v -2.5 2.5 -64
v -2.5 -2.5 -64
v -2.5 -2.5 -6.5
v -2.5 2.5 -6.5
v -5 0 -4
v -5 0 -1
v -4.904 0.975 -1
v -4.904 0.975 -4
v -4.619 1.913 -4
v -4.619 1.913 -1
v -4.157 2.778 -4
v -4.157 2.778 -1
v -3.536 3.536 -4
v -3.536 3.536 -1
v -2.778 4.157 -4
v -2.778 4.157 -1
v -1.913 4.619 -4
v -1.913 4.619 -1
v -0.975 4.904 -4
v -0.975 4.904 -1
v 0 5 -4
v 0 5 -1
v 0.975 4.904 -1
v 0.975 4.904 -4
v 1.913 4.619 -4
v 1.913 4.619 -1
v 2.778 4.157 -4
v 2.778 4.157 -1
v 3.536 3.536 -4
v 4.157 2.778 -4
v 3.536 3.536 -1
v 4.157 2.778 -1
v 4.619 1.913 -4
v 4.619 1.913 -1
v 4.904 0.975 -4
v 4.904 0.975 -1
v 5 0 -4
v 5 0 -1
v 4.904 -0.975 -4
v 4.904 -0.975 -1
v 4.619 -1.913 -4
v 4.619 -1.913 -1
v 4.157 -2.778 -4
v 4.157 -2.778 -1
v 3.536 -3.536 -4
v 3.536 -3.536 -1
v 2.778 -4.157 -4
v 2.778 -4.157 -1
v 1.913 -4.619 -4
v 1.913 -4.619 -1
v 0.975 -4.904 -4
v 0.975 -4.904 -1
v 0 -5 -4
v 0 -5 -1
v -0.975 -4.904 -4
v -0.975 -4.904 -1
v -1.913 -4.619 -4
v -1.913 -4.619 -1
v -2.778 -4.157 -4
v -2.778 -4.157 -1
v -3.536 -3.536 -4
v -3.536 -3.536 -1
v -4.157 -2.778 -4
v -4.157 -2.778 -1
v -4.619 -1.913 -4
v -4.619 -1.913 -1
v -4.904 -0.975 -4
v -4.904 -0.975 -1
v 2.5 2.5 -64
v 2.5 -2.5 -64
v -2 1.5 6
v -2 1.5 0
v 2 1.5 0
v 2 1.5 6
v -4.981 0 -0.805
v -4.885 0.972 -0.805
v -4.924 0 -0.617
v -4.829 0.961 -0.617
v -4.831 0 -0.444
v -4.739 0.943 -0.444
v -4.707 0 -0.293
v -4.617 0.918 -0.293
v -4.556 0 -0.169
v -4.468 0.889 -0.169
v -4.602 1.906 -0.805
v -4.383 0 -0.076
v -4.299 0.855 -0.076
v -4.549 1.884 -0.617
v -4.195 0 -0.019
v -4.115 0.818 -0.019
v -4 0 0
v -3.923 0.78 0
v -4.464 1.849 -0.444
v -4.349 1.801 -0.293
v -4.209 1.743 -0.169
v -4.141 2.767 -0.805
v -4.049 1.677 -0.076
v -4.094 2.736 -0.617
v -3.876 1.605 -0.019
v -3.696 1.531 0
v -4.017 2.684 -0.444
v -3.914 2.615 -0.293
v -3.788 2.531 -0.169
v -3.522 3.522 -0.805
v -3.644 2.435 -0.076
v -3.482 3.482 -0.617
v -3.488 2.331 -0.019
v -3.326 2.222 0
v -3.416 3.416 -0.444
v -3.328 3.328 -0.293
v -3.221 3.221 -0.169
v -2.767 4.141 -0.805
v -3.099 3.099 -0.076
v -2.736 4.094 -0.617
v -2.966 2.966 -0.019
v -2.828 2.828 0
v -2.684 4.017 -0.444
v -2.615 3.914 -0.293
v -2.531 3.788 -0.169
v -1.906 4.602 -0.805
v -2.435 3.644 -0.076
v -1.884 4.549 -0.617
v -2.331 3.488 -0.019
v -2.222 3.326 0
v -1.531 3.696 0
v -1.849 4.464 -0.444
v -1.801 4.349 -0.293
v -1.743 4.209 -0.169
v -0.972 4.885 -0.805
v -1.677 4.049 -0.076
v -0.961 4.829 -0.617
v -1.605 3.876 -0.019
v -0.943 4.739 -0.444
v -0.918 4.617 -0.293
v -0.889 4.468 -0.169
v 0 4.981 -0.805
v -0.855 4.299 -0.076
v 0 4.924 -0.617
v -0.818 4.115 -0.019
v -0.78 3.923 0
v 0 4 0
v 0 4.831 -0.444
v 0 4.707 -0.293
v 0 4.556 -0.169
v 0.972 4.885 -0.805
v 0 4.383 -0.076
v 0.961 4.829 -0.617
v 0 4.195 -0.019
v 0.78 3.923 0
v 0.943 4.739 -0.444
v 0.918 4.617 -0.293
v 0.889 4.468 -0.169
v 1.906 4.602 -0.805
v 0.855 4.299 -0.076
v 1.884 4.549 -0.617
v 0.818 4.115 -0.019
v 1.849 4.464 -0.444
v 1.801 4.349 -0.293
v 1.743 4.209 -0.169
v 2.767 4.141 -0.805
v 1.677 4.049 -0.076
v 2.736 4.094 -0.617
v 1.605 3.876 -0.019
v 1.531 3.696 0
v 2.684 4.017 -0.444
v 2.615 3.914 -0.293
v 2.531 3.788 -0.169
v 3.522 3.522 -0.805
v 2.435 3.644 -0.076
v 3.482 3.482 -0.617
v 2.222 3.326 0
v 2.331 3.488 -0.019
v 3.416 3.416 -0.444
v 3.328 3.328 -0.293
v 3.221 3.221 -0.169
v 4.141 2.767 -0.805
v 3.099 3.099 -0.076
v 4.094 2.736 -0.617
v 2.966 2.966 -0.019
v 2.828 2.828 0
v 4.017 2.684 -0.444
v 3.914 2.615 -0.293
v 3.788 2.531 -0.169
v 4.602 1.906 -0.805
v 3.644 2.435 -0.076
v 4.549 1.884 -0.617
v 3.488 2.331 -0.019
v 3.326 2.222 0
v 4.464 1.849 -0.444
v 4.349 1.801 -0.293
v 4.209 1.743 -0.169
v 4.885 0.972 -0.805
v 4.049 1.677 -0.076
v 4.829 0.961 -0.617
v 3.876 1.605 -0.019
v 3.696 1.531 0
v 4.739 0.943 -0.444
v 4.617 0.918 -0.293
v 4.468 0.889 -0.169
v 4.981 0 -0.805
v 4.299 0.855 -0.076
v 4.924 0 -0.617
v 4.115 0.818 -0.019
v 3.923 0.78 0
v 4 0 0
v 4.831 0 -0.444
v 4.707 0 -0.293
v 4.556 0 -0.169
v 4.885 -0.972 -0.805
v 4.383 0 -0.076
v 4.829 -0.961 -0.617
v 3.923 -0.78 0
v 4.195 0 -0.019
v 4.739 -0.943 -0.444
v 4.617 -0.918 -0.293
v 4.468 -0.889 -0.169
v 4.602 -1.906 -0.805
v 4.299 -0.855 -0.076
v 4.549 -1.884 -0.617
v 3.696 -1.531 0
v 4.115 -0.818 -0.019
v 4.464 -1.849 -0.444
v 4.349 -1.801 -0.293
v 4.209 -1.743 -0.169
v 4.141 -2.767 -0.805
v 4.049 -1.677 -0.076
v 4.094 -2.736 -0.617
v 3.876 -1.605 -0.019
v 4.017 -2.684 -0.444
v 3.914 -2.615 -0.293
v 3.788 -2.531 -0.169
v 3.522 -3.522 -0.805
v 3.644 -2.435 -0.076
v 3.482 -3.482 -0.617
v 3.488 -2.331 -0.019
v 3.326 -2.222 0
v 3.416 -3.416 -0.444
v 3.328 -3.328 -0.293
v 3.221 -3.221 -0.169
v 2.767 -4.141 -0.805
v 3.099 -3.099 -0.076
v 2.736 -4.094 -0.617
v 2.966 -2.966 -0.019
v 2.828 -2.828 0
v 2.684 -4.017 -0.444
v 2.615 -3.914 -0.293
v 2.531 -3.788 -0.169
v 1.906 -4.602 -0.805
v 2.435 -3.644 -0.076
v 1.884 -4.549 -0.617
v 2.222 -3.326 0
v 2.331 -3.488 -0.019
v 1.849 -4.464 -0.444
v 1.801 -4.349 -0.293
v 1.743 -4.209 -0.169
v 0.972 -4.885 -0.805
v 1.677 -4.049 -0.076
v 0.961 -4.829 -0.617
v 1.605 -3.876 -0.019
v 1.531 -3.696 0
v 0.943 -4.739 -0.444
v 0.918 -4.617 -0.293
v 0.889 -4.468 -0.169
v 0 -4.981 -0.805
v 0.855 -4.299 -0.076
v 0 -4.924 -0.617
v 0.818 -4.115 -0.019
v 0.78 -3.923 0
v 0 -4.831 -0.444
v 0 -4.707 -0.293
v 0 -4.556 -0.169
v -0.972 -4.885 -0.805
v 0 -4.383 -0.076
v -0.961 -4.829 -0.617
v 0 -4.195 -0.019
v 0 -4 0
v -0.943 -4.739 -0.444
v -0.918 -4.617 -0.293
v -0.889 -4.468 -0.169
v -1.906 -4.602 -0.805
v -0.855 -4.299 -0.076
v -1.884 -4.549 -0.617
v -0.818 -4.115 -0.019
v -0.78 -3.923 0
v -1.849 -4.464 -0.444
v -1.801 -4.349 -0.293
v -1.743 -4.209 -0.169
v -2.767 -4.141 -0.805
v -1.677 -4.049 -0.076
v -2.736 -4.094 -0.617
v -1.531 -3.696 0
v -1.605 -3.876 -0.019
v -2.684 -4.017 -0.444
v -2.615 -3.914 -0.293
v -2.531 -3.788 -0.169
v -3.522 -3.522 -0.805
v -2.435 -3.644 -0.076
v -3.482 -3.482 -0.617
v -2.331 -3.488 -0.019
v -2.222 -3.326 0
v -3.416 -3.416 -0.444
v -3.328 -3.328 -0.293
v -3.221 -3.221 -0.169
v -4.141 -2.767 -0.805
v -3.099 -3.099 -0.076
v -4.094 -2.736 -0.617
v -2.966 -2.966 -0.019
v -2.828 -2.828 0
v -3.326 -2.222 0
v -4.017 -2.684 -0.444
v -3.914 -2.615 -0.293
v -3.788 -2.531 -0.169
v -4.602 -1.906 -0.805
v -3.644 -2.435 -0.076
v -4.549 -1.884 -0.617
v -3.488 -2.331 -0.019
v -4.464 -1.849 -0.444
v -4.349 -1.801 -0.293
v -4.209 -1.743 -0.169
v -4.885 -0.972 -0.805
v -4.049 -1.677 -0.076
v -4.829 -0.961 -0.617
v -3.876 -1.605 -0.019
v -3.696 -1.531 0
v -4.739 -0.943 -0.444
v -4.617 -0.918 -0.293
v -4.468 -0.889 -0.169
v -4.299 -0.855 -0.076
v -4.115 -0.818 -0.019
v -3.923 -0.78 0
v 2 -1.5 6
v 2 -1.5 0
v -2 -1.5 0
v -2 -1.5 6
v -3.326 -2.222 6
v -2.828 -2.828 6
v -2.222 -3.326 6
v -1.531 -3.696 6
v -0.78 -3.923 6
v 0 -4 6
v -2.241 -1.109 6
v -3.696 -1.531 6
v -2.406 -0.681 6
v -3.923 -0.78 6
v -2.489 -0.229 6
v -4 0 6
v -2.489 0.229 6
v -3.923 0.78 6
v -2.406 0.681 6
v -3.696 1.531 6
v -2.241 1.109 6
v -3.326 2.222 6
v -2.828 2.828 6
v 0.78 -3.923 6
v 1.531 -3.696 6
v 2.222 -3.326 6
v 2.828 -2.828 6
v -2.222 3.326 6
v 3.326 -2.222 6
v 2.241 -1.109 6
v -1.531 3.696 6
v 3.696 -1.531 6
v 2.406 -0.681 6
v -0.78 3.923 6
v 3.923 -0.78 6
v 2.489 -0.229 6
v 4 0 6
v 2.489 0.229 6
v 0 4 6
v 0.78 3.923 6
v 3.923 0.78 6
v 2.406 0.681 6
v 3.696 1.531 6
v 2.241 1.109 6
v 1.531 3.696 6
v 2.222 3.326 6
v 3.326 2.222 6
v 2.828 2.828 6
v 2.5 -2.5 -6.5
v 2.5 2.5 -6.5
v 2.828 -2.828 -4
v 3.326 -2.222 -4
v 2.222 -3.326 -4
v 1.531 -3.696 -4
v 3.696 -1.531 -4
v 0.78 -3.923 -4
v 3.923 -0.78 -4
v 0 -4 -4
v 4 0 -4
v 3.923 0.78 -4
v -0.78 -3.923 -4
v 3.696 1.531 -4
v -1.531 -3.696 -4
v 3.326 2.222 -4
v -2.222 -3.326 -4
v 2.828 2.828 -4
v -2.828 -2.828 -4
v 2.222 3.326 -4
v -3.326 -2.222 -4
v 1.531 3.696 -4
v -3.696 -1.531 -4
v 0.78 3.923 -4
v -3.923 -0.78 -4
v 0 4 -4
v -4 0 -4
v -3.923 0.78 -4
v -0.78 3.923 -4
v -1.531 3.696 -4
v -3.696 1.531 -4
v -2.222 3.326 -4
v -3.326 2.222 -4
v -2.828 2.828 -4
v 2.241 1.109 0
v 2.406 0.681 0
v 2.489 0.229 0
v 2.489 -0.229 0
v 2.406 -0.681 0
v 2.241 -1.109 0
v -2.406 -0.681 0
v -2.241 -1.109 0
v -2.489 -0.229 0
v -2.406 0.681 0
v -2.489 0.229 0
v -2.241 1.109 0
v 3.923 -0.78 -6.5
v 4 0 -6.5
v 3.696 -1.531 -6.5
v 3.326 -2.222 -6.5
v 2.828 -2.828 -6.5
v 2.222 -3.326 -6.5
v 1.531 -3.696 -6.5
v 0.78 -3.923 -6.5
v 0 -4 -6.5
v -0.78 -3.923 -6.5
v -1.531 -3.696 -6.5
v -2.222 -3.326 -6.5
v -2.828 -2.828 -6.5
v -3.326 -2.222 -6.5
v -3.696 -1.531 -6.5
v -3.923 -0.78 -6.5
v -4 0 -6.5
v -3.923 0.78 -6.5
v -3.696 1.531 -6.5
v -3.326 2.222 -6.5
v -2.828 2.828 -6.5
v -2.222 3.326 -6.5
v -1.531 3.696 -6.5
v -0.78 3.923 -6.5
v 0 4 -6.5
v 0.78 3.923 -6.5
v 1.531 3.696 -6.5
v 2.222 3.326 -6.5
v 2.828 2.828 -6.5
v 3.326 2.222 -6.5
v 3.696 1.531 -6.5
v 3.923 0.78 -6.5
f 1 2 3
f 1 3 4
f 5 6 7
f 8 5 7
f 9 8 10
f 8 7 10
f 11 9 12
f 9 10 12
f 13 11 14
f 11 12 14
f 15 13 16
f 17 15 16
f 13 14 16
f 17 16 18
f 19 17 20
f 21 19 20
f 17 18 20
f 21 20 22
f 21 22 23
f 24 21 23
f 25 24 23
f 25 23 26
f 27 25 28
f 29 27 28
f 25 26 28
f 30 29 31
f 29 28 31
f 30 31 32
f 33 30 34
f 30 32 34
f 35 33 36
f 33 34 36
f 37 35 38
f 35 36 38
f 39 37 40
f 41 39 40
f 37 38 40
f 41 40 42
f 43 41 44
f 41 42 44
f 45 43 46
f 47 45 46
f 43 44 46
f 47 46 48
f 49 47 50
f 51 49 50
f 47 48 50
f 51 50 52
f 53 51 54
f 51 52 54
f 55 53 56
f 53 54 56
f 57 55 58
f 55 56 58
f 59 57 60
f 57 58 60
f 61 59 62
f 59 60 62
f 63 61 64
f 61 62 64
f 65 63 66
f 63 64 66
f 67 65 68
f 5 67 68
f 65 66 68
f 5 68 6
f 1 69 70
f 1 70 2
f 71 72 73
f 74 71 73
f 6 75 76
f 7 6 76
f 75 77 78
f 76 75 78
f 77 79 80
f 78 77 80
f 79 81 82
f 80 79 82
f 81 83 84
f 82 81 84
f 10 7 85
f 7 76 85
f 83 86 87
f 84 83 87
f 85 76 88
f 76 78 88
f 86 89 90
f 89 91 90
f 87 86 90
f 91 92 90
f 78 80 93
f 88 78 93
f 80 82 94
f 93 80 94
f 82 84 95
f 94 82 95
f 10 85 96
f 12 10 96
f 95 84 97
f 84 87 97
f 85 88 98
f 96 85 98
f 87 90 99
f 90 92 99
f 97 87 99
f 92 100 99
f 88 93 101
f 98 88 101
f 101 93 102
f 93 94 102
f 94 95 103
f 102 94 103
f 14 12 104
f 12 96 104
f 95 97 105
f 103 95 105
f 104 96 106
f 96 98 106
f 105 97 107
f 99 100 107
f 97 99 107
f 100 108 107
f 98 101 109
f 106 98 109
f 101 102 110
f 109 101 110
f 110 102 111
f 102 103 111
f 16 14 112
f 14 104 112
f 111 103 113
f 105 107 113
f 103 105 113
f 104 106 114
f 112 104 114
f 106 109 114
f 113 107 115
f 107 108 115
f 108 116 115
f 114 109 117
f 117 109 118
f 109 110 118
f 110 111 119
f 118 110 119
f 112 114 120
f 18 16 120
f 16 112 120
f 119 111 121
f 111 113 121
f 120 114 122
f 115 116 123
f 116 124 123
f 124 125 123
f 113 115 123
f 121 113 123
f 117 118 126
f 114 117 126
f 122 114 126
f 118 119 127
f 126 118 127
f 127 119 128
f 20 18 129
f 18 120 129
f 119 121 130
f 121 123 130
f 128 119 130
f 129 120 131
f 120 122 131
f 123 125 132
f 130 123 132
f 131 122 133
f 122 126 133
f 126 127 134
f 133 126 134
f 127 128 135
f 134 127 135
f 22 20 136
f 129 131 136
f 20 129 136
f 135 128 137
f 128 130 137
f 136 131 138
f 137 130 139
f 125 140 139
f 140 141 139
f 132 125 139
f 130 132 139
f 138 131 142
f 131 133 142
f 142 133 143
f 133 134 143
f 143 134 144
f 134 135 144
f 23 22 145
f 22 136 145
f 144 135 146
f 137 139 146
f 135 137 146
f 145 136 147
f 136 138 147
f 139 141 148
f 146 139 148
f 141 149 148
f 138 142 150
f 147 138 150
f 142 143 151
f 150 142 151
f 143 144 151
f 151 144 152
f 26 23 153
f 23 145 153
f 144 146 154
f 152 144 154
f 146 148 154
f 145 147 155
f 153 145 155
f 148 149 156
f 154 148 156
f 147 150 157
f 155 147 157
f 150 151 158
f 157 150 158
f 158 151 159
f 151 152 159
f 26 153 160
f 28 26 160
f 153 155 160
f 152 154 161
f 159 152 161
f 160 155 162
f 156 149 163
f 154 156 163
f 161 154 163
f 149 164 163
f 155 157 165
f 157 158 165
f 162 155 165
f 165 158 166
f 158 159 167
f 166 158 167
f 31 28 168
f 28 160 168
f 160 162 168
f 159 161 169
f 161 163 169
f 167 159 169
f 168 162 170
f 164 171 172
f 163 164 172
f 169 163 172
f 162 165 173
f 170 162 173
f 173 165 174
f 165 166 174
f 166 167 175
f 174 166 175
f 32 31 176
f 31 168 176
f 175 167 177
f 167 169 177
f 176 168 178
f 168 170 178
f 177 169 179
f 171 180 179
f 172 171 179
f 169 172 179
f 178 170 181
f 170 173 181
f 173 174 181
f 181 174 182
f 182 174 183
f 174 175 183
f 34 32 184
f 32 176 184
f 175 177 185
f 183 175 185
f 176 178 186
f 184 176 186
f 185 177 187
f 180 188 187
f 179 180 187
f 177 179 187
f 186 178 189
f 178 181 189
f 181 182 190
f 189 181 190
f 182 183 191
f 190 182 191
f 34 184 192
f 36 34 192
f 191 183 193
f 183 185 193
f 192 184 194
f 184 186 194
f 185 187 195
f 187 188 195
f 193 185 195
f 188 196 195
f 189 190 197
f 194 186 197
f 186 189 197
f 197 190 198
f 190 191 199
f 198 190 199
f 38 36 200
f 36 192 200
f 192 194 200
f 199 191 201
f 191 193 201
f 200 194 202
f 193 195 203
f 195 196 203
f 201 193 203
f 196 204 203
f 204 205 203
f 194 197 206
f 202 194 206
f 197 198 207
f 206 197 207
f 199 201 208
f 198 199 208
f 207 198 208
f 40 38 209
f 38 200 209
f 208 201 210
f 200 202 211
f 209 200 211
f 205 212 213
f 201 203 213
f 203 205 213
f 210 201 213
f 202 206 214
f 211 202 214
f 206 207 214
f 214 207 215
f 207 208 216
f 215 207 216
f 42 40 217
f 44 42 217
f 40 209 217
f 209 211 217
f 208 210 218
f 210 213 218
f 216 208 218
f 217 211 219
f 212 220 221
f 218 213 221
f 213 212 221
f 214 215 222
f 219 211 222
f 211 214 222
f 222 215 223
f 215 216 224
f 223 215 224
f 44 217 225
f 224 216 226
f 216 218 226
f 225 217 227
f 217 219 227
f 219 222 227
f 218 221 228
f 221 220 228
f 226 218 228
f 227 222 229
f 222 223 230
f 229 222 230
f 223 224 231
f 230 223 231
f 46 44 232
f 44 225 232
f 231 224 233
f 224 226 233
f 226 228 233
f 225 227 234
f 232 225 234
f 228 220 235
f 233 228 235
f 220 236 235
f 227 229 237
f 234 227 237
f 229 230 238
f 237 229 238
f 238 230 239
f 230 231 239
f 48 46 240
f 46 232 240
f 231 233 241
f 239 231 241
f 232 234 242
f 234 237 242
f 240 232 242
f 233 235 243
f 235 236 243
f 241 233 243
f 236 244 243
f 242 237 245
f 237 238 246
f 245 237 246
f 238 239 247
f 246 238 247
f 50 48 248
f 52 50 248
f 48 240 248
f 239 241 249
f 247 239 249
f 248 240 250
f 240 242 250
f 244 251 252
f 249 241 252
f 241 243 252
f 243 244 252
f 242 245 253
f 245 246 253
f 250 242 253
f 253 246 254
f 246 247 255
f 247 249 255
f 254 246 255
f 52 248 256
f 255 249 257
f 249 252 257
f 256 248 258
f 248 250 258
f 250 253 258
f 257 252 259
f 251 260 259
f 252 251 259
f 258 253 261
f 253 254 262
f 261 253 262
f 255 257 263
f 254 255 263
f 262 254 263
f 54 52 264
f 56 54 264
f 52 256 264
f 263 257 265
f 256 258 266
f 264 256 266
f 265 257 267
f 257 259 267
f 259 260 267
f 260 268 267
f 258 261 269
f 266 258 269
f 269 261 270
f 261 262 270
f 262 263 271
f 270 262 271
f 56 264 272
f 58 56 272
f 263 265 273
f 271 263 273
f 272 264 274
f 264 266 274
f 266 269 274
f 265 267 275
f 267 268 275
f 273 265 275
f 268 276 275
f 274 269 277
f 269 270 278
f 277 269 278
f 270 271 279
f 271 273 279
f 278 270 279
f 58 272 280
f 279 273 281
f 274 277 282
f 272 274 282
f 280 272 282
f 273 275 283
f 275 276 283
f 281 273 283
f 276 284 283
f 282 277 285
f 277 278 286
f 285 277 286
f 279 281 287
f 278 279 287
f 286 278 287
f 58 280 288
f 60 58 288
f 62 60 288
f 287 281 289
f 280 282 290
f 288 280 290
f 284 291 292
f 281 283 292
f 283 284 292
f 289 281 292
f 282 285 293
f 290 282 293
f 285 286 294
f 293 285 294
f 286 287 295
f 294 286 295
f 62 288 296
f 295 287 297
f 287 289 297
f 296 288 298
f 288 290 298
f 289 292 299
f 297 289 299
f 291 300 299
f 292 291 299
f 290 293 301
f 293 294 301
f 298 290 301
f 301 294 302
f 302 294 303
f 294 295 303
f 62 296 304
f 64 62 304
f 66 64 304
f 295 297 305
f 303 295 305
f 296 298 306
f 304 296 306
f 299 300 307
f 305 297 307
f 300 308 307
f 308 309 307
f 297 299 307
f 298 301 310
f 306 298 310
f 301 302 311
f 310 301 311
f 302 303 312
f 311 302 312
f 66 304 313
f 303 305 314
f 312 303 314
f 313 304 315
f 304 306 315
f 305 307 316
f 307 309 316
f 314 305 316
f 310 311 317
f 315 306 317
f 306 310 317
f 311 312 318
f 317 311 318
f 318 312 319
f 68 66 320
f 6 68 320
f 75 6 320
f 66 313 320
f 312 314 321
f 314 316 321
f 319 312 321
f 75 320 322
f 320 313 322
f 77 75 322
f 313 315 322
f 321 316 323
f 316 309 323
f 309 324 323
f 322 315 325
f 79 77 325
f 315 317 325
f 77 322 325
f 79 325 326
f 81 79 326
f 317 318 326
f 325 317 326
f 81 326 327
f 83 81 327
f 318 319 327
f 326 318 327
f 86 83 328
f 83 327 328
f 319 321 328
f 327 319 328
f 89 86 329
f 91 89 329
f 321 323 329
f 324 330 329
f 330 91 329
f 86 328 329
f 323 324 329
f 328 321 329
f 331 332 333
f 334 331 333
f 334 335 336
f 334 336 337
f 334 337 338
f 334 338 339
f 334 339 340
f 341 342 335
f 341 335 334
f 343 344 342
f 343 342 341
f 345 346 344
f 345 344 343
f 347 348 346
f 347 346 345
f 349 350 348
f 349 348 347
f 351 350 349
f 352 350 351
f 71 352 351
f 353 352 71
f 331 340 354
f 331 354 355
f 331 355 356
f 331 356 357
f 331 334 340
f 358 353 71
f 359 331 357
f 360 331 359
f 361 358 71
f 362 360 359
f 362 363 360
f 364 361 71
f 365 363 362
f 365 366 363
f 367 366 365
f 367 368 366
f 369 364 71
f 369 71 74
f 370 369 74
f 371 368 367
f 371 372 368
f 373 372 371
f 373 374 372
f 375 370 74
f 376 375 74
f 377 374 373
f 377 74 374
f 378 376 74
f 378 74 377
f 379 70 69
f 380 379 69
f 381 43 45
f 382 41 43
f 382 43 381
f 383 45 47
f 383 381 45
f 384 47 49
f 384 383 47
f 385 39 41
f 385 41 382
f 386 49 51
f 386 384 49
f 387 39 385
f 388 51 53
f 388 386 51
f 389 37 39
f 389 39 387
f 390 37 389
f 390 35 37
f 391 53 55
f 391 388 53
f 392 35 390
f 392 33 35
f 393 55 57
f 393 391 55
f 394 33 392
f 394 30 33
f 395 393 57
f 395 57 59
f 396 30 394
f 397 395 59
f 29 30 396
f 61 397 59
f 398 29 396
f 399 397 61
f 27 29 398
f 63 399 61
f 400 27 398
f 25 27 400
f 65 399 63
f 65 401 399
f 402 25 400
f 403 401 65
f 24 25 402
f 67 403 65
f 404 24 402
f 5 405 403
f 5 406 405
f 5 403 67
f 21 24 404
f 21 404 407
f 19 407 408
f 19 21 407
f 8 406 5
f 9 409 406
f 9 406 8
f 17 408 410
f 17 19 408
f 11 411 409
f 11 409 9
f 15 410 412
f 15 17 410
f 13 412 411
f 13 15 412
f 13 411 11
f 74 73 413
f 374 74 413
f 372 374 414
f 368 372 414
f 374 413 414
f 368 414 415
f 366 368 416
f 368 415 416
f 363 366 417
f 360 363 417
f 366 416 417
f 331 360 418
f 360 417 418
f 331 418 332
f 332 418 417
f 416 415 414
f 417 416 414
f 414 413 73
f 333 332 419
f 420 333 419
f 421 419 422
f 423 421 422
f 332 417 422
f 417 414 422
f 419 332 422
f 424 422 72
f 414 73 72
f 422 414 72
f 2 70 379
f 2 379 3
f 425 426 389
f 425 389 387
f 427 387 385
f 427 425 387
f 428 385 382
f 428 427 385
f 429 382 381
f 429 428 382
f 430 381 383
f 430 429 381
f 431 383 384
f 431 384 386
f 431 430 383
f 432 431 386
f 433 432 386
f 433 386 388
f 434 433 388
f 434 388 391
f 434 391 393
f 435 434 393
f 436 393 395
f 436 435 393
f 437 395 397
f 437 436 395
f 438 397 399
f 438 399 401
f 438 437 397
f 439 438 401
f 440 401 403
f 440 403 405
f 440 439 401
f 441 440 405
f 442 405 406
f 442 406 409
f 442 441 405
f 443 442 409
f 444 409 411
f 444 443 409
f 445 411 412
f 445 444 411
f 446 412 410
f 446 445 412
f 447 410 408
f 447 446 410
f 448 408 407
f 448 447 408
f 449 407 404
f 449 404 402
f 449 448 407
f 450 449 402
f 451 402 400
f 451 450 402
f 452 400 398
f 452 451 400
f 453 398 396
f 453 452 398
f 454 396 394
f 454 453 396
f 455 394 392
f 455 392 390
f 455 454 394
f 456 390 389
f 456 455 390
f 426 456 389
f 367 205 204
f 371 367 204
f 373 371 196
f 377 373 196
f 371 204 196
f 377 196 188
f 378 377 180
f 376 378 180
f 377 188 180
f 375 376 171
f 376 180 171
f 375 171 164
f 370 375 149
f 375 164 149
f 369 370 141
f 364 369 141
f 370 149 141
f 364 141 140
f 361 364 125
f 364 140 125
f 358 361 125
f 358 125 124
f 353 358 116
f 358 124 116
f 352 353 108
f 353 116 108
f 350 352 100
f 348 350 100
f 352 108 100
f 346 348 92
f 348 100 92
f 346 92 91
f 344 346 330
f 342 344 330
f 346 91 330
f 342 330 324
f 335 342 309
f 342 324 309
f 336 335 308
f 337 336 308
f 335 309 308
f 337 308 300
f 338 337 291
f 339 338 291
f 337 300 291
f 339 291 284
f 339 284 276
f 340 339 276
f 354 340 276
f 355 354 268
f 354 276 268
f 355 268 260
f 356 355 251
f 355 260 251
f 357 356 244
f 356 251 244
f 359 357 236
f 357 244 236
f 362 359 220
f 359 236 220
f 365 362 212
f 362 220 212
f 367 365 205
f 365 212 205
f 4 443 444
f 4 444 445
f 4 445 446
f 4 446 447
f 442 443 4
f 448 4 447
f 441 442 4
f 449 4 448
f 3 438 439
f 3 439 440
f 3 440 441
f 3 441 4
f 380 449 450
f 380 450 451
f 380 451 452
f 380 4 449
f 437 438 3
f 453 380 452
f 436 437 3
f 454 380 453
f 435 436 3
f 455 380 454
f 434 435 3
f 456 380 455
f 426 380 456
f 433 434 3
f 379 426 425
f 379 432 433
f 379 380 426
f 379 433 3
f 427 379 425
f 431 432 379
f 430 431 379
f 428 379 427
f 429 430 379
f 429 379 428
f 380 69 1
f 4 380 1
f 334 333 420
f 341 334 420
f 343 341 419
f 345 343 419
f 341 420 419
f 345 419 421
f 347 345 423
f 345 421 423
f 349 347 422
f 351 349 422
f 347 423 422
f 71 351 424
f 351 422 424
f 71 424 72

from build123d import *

# Parameters (mm, degrees)
ESQUISSE1_R        = 4
BOSS_EXTRU_1_DEPTH = 6
ESQUISSE2_R        = 5
BOSS_EXTRU_2_DEPTH = 4
CONG_1_R           = 1
ESQUISSE3_W        = 5
ESQUISSE3_H        = 5
BOSS_EXTRU_3_DEPTH = 60
BOSS_EXTRU_4_START = 2.5
ESQUISSE4_R        = 4
BOSS_EXTRU_4_DEPTH = 2.5


with BuildPart() as part:
    # Esquisse1 → Boss.-Extru.1 (new body)
    with BuildSketch(Plane.XY):
        Circle(ESQUISSE1_R)
        with BuildLine():
            Line((-2, 1.5), (2, 1.5))
            ThreePointArc((2, 1.5), (2.5, 0), (2, -1.5))
            Line((2, -1.5), (-2, -1.5))
            ThreePointArc((-2, -1.5), (-2.5, 0), (-2, 1.5))
        make_face(mode=Mode.SUBTRACT)
    extrude(amount=BOSS_EXTRU_1_DEPTH)

    # Esquisse2 → Boss.-Extru.2 (add)
    with BuildSketch(Plane(origin=(0, 0, 0), x_dir=(-1, 0, 0), z_dir=(0, 0, -1))):
        Circle(ESQUISSE2_R)
    extrude(amount=BOSS_EXTRU_2_DEPTH)

    # Congé1
    cong_1_edges = [part.edges().sort_by_distance(p)[0] for p in [
        (5, 0, 0),
    ]]
    fillet(cong_1_edges, radius=CONG_1_R - 0.0001)  # a hair under: the kernel refuses the full size

    # Esquisse3 → Boss.-Extru.3 (add)
    with BuildSketch(Plane(origin=(0, 0, -4), x_dir=(-1, 0, 0), z_dir=(0, 0, -1))):
        Rectangle(ESQUISSE3_W, ESQUISSE3_H)
    extrude(amount=BOSS_EXTRU_3_DEPTH)

    # Esquisse4 → Boss.-Extru.4 (add)
    with BuildSketch(Plane(origin=(0, 0, -4), x_dir=(-1, 0, 0), z_dir=(0, 0, -1)).offset(BOSS_EXTRU_4_START)):
        with Locations(Location((0, 0, 0), (0, 0, 180))):
            Circle(ESQUISSE4_R)
    extrude(amount=-BOSS_EXTRU_4_DEPTH)


solid = part.part
